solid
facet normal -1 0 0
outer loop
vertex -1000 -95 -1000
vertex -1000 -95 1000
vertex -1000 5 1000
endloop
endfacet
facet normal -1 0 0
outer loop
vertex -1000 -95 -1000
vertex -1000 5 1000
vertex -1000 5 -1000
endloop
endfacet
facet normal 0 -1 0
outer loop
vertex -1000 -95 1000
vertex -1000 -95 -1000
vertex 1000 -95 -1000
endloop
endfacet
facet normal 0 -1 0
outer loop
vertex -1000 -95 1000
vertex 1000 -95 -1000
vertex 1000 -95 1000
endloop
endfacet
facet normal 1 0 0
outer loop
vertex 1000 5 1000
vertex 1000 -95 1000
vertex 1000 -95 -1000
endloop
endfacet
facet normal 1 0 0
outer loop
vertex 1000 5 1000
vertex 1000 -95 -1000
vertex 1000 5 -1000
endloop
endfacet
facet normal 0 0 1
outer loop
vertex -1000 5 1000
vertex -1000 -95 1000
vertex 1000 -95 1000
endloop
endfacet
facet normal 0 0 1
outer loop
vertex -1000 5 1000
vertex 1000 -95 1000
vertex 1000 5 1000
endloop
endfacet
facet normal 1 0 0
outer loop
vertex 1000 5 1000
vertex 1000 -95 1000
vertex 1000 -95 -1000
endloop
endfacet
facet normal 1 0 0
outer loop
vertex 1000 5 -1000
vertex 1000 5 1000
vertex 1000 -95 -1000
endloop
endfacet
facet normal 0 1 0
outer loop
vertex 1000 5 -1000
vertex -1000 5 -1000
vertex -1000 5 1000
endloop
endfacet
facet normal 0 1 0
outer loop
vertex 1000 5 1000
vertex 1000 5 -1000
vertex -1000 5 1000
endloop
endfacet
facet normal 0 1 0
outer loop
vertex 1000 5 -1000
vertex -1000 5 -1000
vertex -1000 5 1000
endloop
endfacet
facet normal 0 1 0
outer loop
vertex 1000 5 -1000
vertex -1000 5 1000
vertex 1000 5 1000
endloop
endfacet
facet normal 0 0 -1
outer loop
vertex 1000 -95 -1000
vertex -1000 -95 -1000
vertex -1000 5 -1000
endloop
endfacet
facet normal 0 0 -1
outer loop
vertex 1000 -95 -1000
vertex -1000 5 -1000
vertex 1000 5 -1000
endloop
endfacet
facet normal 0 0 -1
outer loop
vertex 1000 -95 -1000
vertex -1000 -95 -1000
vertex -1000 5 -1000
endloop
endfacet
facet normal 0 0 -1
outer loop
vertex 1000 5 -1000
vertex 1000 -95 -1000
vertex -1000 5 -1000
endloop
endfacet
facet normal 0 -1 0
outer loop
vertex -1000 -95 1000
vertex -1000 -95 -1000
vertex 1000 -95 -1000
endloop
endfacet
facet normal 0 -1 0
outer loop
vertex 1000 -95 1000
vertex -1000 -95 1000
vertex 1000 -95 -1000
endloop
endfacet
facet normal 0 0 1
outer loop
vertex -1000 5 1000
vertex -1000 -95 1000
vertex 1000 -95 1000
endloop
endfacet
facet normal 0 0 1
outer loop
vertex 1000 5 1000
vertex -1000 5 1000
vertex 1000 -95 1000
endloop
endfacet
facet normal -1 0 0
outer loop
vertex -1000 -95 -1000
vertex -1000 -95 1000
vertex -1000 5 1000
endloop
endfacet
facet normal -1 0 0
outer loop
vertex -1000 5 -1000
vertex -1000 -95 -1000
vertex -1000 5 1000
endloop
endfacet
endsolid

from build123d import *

# Parameters (mm, degrees)
BOSS_EXTRUDE1_DEPTH       = 5
BOSS_EXTRUDE1_DEPTH_BACK  = 95
SKETCH1_W                 = 2000
SKETCH1_H                 = 2000
BODY_MOVE_COPY1_START     = -1000
BODY_MOVE_COPY1_OUTLINE_W = 100
BODY_MOVE_COPY1_OUTLINE_H = 2000
BODY_MOVE_COPY1_DEPTH     = 2000


# Read off the part's stored shape, not the designer's step: Body-Move/Copy1
with BuildPart() as part:
    # Sketch1 → Boss-Extrude1 (new, two sides: drawn at the far end of the back side and taken through both)
    with BuildSketch(Plane(origin=(0, 0, 0), x_dir=(1, 0, 0), z_dir=(0, 1, 0)).offset(-BOSS_EXTRUDE1_DEPTH_BACK)):
        Rectangle(SKETCH1_W, SKETCH1_H)
    extrude(amount=BOSS_EXTRUDE1_DEPTH + BOSS_EXTRUDE1_DEPTH_BACK)


with BuildPart() as body_2:
    # Body-Move/Copy1 outline → Body-Move/Copy1 (new body)
    with BuildSketch(Plane.YZ.offset(BODY_MOVE_COPY1_START)):
        with Locations((-45, 0)):
            Rectangle(BODY_MOVE_COPY1_OUTLINE_W, BODY_MOVE_COPY1_OUTLINE_H)
    extrude(amount=BODY_MOVE_COPY1_DEPTH)


solid = Compound([part.part, body_2.part])
